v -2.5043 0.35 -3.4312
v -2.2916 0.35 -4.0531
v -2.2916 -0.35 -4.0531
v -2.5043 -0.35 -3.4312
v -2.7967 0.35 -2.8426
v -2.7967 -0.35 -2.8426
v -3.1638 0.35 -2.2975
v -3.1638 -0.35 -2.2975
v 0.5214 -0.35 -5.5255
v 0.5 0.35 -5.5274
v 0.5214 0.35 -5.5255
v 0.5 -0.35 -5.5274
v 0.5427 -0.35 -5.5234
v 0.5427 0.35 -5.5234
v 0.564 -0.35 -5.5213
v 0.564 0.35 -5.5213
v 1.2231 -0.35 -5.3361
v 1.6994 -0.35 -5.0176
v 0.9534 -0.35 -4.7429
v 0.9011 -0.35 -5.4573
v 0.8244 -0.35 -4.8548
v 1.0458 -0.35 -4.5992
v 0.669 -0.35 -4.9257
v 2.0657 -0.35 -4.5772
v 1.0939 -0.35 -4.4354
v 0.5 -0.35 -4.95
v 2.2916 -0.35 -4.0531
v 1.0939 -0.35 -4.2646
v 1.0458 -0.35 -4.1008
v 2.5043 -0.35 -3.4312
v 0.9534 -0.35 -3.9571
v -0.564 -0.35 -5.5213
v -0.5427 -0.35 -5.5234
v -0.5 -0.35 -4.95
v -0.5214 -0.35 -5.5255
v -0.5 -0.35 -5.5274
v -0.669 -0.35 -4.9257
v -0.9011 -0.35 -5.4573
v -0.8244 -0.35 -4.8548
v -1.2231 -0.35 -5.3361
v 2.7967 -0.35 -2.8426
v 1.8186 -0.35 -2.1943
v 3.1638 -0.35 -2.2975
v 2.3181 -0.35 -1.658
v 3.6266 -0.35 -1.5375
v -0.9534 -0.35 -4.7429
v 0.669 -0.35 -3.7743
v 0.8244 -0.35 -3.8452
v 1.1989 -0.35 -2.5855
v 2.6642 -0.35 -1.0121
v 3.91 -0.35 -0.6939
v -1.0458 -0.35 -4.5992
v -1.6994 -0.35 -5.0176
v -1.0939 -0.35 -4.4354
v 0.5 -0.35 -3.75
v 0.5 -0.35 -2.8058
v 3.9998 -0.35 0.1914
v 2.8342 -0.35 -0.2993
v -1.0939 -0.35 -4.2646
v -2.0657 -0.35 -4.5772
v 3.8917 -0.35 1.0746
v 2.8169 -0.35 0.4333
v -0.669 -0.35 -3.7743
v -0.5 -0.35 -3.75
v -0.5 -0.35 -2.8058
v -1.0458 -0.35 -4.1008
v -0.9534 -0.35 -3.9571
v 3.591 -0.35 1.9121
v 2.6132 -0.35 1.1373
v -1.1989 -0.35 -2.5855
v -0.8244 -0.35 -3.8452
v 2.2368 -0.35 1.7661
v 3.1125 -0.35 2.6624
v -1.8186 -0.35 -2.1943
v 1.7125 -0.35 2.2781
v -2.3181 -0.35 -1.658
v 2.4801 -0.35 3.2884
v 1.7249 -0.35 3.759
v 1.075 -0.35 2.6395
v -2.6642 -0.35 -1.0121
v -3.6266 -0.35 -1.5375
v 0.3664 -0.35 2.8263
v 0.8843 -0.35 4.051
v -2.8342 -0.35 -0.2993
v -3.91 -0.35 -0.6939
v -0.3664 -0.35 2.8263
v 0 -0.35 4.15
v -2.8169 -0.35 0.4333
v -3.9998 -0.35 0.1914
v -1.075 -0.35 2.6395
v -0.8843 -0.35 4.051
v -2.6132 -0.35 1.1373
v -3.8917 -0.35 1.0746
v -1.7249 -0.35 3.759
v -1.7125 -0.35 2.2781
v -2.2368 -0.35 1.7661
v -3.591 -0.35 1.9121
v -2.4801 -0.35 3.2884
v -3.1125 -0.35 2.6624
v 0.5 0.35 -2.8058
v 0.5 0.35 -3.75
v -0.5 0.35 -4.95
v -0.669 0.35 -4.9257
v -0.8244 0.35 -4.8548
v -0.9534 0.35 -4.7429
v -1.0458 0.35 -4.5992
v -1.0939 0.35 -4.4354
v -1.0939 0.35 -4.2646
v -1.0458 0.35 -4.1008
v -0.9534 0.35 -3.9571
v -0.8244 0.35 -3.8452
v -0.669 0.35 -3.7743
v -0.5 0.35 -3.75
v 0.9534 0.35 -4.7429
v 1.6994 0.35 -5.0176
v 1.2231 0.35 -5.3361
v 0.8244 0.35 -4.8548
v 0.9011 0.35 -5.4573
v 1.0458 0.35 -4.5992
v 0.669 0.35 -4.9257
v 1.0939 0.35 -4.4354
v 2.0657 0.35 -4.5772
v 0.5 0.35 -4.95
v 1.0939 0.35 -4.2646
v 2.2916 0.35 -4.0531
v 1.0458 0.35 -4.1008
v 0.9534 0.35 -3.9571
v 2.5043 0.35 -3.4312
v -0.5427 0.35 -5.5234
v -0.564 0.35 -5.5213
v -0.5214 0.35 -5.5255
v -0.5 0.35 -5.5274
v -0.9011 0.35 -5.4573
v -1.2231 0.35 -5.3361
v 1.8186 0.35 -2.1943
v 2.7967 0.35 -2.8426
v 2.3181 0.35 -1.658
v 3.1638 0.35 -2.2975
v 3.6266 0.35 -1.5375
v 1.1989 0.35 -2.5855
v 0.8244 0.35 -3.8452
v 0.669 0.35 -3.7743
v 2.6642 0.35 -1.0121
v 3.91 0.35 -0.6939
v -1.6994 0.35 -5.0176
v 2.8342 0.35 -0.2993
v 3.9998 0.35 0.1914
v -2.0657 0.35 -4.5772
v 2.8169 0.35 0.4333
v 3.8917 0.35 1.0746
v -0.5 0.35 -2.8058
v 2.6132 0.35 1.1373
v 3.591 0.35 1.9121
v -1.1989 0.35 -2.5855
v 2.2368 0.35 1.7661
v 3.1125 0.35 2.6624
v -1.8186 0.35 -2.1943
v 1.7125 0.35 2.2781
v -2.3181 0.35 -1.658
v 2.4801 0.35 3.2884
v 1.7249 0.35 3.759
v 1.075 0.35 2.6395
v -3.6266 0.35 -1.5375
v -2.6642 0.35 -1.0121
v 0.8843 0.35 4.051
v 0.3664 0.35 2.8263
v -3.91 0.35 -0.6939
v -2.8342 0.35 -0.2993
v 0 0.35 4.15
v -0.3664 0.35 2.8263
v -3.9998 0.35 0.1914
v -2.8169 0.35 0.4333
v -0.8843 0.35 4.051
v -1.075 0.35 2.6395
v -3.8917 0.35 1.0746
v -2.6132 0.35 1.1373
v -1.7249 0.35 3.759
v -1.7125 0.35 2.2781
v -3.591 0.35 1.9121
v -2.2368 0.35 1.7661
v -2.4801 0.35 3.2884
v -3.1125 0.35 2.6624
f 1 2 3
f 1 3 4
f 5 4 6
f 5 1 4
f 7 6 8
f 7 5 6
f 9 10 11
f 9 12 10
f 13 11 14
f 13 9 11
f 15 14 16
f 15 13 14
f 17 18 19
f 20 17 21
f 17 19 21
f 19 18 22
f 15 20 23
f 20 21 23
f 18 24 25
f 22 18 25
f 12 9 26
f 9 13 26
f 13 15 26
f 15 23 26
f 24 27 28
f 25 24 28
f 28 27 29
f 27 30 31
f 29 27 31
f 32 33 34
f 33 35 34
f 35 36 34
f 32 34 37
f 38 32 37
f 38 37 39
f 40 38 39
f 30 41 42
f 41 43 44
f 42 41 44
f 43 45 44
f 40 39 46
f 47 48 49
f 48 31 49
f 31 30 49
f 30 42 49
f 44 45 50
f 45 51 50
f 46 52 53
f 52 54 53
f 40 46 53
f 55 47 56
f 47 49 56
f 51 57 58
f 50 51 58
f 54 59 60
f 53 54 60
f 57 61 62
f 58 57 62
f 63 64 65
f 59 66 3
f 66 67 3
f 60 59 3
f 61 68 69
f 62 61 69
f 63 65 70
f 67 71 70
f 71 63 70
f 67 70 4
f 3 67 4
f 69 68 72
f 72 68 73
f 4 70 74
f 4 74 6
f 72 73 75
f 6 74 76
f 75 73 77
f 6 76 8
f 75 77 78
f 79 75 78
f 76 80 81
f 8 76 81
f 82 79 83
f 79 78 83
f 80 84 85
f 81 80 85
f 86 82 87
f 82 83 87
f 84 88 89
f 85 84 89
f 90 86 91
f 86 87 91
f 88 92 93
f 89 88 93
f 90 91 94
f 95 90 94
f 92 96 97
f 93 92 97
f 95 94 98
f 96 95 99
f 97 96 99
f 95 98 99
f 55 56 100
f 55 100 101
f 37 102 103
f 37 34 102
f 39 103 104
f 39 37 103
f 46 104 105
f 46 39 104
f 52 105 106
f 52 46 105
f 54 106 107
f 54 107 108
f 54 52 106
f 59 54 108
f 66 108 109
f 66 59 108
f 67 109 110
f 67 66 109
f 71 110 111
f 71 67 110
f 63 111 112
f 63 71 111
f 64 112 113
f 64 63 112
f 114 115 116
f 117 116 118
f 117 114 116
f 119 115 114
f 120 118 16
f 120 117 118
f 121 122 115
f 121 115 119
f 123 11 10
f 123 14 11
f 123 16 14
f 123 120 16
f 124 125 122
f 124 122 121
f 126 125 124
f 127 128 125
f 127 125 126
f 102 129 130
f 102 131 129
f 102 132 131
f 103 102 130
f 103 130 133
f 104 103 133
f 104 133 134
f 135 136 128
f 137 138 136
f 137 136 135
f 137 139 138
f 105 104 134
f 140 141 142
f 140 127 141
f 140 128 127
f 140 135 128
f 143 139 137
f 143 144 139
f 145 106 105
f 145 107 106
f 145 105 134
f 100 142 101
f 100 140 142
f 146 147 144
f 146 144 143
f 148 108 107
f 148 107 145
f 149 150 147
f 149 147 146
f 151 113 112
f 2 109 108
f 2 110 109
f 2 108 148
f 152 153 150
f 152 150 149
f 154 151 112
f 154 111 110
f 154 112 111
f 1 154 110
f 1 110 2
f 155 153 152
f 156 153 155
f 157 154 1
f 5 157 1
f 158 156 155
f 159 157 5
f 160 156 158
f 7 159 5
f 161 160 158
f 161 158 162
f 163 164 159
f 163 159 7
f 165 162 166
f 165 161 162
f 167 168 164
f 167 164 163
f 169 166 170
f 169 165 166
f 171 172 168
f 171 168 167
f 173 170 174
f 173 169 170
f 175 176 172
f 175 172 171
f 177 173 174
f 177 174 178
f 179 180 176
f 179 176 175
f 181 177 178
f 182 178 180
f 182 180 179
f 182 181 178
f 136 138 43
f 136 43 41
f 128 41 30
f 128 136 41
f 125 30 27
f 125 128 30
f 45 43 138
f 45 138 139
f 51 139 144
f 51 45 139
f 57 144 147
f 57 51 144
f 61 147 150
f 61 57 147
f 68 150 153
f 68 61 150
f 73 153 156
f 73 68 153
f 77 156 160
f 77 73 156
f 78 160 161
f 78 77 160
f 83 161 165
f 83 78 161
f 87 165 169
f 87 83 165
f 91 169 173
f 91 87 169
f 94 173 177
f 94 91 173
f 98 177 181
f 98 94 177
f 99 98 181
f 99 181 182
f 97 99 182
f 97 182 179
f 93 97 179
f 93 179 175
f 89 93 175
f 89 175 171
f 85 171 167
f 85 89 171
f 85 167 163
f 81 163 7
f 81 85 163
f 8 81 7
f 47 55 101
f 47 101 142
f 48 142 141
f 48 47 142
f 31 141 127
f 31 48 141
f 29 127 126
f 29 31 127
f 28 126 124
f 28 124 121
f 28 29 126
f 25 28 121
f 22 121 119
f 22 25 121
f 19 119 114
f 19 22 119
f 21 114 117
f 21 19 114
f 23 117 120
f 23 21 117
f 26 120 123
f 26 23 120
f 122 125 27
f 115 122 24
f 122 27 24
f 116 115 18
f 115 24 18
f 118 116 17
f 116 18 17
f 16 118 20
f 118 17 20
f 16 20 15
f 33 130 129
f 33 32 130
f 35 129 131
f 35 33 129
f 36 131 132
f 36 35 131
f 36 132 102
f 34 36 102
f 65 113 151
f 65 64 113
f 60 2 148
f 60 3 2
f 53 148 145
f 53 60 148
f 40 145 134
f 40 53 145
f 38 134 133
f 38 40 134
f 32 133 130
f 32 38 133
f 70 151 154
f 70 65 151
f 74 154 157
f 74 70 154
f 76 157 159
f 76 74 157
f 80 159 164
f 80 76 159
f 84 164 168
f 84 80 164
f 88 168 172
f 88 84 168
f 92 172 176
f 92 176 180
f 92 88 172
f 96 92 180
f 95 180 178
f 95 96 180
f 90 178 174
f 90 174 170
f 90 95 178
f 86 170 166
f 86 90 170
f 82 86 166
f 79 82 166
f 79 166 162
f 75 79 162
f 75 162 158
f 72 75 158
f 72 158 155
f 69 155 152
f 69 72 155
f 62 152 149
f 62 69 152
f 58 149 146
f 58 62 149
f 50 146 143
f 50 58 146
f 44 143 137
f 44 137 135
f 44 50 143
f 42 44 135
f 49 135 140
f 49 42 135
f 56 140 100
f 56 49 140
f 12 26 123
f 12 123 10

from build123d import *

# Parameters (mm, degrees)
F1_DEPTH    = 0.35
F2_T1_DEPTH = 0.7
F3_R        = 2


# Not quite as in the source:
# - a fillet or chamfer that OpenCascade refuses, or shapes differently, is made with other operations: its cross-section is extruded or revolved along the edge and cut away or added


with BuildPart() as f1:
    # F0 (on Front) → F1 (new body, symmetric)
    with BuildSketch(Plane.XZ):
        with BuildLine():
            ThreePointArc((-0.5, -2.8057975693), (0, 2.85), (0.5, -2.8057975693))
            Line((0.5, -2.8057975693), (0.5, -3.75))
            ThreePointArc((0.5, -3.75), (1.1, -4.35), (0.5, -4.95))
            Line((0.5, -4.95), (0.5, -5.5274315916))
            ThreePointArc((0.5, -5.5274315916), (1.3270959738, -5.3889995617), (2.1238930496, -5.1275314054))
            Line((2.1238930496, -5.1275314054), (1.4775430927, -3.5671045734))
            ThreePointArc((1.4775430927, -3.5671045734), (0, 4.15), (-1.4775430927, -3.5671045734))
            Line((-1.4775430927, -3.5671045734), (-2.1238930496, -5.1275314054))
            ThreePointArc((-2.1238930496, -5.1275314054), (-1.3270959738, -5.3889995617), (-0.5, -5.5274315916))
            Line((-0.5, -5.5274315916), (-0.5, -4.95))
            ThreePointArc((-0.5, -4.95), (-1.1, -4.35), (-0.5, -3.75))
            Line((-0.5, -3.75), (-0.5, -2.8057975693))
        make_face()
    extrude(amount=F1_DEPTH, both=True)

    # F2: fillet of radius 5 on 2 edges, made by hand

    # F2_s2 → F2_t1 (join)
    with BuildSketch(Plane.XZ.offset(-0.35)):
        with BuildLine():
            ThreePointArc((3.163836873, -2.2974754832), (2.4254620947, -3.6322482415), (2.1238930496, -5.1275314054))
            Line((2.1238930496, -5.1275314054), (1.4775430927, -3.5671045734))
            ThreePointArc((1.4775430927, -3.5671045734), (2.4059491896, -3.0455294549), (3.163836873, -2.2974754832))
        make_face()
        with BuildLine():
            ThreePointArc((-2.1238930496, -5.1275314054), (-2.4254620947, -3.6322482415), (-3.163836873, -2.2974754832))
            ThreePointArc((-3.163836873, -2.2974754832), (-2.4059491896, -3.0455294549), (-1.4775430927, -3.5671045734))
            Line((-1.4775430927, -3.5671045734), (-2.1238930496, -5.1275314054))
        make_face()
    extrude(amount=F2_T1_DEPTH)

    # F3
    f3_edges = [f1.edges().sort_by_distance(p)[0] for p in [
        (-2.123893, 0, -5.127531),
        (2.123893, 0, -5.127531),
    ]]
    fillet(f3_edges, radius=F3_R)


solid = f1.part
